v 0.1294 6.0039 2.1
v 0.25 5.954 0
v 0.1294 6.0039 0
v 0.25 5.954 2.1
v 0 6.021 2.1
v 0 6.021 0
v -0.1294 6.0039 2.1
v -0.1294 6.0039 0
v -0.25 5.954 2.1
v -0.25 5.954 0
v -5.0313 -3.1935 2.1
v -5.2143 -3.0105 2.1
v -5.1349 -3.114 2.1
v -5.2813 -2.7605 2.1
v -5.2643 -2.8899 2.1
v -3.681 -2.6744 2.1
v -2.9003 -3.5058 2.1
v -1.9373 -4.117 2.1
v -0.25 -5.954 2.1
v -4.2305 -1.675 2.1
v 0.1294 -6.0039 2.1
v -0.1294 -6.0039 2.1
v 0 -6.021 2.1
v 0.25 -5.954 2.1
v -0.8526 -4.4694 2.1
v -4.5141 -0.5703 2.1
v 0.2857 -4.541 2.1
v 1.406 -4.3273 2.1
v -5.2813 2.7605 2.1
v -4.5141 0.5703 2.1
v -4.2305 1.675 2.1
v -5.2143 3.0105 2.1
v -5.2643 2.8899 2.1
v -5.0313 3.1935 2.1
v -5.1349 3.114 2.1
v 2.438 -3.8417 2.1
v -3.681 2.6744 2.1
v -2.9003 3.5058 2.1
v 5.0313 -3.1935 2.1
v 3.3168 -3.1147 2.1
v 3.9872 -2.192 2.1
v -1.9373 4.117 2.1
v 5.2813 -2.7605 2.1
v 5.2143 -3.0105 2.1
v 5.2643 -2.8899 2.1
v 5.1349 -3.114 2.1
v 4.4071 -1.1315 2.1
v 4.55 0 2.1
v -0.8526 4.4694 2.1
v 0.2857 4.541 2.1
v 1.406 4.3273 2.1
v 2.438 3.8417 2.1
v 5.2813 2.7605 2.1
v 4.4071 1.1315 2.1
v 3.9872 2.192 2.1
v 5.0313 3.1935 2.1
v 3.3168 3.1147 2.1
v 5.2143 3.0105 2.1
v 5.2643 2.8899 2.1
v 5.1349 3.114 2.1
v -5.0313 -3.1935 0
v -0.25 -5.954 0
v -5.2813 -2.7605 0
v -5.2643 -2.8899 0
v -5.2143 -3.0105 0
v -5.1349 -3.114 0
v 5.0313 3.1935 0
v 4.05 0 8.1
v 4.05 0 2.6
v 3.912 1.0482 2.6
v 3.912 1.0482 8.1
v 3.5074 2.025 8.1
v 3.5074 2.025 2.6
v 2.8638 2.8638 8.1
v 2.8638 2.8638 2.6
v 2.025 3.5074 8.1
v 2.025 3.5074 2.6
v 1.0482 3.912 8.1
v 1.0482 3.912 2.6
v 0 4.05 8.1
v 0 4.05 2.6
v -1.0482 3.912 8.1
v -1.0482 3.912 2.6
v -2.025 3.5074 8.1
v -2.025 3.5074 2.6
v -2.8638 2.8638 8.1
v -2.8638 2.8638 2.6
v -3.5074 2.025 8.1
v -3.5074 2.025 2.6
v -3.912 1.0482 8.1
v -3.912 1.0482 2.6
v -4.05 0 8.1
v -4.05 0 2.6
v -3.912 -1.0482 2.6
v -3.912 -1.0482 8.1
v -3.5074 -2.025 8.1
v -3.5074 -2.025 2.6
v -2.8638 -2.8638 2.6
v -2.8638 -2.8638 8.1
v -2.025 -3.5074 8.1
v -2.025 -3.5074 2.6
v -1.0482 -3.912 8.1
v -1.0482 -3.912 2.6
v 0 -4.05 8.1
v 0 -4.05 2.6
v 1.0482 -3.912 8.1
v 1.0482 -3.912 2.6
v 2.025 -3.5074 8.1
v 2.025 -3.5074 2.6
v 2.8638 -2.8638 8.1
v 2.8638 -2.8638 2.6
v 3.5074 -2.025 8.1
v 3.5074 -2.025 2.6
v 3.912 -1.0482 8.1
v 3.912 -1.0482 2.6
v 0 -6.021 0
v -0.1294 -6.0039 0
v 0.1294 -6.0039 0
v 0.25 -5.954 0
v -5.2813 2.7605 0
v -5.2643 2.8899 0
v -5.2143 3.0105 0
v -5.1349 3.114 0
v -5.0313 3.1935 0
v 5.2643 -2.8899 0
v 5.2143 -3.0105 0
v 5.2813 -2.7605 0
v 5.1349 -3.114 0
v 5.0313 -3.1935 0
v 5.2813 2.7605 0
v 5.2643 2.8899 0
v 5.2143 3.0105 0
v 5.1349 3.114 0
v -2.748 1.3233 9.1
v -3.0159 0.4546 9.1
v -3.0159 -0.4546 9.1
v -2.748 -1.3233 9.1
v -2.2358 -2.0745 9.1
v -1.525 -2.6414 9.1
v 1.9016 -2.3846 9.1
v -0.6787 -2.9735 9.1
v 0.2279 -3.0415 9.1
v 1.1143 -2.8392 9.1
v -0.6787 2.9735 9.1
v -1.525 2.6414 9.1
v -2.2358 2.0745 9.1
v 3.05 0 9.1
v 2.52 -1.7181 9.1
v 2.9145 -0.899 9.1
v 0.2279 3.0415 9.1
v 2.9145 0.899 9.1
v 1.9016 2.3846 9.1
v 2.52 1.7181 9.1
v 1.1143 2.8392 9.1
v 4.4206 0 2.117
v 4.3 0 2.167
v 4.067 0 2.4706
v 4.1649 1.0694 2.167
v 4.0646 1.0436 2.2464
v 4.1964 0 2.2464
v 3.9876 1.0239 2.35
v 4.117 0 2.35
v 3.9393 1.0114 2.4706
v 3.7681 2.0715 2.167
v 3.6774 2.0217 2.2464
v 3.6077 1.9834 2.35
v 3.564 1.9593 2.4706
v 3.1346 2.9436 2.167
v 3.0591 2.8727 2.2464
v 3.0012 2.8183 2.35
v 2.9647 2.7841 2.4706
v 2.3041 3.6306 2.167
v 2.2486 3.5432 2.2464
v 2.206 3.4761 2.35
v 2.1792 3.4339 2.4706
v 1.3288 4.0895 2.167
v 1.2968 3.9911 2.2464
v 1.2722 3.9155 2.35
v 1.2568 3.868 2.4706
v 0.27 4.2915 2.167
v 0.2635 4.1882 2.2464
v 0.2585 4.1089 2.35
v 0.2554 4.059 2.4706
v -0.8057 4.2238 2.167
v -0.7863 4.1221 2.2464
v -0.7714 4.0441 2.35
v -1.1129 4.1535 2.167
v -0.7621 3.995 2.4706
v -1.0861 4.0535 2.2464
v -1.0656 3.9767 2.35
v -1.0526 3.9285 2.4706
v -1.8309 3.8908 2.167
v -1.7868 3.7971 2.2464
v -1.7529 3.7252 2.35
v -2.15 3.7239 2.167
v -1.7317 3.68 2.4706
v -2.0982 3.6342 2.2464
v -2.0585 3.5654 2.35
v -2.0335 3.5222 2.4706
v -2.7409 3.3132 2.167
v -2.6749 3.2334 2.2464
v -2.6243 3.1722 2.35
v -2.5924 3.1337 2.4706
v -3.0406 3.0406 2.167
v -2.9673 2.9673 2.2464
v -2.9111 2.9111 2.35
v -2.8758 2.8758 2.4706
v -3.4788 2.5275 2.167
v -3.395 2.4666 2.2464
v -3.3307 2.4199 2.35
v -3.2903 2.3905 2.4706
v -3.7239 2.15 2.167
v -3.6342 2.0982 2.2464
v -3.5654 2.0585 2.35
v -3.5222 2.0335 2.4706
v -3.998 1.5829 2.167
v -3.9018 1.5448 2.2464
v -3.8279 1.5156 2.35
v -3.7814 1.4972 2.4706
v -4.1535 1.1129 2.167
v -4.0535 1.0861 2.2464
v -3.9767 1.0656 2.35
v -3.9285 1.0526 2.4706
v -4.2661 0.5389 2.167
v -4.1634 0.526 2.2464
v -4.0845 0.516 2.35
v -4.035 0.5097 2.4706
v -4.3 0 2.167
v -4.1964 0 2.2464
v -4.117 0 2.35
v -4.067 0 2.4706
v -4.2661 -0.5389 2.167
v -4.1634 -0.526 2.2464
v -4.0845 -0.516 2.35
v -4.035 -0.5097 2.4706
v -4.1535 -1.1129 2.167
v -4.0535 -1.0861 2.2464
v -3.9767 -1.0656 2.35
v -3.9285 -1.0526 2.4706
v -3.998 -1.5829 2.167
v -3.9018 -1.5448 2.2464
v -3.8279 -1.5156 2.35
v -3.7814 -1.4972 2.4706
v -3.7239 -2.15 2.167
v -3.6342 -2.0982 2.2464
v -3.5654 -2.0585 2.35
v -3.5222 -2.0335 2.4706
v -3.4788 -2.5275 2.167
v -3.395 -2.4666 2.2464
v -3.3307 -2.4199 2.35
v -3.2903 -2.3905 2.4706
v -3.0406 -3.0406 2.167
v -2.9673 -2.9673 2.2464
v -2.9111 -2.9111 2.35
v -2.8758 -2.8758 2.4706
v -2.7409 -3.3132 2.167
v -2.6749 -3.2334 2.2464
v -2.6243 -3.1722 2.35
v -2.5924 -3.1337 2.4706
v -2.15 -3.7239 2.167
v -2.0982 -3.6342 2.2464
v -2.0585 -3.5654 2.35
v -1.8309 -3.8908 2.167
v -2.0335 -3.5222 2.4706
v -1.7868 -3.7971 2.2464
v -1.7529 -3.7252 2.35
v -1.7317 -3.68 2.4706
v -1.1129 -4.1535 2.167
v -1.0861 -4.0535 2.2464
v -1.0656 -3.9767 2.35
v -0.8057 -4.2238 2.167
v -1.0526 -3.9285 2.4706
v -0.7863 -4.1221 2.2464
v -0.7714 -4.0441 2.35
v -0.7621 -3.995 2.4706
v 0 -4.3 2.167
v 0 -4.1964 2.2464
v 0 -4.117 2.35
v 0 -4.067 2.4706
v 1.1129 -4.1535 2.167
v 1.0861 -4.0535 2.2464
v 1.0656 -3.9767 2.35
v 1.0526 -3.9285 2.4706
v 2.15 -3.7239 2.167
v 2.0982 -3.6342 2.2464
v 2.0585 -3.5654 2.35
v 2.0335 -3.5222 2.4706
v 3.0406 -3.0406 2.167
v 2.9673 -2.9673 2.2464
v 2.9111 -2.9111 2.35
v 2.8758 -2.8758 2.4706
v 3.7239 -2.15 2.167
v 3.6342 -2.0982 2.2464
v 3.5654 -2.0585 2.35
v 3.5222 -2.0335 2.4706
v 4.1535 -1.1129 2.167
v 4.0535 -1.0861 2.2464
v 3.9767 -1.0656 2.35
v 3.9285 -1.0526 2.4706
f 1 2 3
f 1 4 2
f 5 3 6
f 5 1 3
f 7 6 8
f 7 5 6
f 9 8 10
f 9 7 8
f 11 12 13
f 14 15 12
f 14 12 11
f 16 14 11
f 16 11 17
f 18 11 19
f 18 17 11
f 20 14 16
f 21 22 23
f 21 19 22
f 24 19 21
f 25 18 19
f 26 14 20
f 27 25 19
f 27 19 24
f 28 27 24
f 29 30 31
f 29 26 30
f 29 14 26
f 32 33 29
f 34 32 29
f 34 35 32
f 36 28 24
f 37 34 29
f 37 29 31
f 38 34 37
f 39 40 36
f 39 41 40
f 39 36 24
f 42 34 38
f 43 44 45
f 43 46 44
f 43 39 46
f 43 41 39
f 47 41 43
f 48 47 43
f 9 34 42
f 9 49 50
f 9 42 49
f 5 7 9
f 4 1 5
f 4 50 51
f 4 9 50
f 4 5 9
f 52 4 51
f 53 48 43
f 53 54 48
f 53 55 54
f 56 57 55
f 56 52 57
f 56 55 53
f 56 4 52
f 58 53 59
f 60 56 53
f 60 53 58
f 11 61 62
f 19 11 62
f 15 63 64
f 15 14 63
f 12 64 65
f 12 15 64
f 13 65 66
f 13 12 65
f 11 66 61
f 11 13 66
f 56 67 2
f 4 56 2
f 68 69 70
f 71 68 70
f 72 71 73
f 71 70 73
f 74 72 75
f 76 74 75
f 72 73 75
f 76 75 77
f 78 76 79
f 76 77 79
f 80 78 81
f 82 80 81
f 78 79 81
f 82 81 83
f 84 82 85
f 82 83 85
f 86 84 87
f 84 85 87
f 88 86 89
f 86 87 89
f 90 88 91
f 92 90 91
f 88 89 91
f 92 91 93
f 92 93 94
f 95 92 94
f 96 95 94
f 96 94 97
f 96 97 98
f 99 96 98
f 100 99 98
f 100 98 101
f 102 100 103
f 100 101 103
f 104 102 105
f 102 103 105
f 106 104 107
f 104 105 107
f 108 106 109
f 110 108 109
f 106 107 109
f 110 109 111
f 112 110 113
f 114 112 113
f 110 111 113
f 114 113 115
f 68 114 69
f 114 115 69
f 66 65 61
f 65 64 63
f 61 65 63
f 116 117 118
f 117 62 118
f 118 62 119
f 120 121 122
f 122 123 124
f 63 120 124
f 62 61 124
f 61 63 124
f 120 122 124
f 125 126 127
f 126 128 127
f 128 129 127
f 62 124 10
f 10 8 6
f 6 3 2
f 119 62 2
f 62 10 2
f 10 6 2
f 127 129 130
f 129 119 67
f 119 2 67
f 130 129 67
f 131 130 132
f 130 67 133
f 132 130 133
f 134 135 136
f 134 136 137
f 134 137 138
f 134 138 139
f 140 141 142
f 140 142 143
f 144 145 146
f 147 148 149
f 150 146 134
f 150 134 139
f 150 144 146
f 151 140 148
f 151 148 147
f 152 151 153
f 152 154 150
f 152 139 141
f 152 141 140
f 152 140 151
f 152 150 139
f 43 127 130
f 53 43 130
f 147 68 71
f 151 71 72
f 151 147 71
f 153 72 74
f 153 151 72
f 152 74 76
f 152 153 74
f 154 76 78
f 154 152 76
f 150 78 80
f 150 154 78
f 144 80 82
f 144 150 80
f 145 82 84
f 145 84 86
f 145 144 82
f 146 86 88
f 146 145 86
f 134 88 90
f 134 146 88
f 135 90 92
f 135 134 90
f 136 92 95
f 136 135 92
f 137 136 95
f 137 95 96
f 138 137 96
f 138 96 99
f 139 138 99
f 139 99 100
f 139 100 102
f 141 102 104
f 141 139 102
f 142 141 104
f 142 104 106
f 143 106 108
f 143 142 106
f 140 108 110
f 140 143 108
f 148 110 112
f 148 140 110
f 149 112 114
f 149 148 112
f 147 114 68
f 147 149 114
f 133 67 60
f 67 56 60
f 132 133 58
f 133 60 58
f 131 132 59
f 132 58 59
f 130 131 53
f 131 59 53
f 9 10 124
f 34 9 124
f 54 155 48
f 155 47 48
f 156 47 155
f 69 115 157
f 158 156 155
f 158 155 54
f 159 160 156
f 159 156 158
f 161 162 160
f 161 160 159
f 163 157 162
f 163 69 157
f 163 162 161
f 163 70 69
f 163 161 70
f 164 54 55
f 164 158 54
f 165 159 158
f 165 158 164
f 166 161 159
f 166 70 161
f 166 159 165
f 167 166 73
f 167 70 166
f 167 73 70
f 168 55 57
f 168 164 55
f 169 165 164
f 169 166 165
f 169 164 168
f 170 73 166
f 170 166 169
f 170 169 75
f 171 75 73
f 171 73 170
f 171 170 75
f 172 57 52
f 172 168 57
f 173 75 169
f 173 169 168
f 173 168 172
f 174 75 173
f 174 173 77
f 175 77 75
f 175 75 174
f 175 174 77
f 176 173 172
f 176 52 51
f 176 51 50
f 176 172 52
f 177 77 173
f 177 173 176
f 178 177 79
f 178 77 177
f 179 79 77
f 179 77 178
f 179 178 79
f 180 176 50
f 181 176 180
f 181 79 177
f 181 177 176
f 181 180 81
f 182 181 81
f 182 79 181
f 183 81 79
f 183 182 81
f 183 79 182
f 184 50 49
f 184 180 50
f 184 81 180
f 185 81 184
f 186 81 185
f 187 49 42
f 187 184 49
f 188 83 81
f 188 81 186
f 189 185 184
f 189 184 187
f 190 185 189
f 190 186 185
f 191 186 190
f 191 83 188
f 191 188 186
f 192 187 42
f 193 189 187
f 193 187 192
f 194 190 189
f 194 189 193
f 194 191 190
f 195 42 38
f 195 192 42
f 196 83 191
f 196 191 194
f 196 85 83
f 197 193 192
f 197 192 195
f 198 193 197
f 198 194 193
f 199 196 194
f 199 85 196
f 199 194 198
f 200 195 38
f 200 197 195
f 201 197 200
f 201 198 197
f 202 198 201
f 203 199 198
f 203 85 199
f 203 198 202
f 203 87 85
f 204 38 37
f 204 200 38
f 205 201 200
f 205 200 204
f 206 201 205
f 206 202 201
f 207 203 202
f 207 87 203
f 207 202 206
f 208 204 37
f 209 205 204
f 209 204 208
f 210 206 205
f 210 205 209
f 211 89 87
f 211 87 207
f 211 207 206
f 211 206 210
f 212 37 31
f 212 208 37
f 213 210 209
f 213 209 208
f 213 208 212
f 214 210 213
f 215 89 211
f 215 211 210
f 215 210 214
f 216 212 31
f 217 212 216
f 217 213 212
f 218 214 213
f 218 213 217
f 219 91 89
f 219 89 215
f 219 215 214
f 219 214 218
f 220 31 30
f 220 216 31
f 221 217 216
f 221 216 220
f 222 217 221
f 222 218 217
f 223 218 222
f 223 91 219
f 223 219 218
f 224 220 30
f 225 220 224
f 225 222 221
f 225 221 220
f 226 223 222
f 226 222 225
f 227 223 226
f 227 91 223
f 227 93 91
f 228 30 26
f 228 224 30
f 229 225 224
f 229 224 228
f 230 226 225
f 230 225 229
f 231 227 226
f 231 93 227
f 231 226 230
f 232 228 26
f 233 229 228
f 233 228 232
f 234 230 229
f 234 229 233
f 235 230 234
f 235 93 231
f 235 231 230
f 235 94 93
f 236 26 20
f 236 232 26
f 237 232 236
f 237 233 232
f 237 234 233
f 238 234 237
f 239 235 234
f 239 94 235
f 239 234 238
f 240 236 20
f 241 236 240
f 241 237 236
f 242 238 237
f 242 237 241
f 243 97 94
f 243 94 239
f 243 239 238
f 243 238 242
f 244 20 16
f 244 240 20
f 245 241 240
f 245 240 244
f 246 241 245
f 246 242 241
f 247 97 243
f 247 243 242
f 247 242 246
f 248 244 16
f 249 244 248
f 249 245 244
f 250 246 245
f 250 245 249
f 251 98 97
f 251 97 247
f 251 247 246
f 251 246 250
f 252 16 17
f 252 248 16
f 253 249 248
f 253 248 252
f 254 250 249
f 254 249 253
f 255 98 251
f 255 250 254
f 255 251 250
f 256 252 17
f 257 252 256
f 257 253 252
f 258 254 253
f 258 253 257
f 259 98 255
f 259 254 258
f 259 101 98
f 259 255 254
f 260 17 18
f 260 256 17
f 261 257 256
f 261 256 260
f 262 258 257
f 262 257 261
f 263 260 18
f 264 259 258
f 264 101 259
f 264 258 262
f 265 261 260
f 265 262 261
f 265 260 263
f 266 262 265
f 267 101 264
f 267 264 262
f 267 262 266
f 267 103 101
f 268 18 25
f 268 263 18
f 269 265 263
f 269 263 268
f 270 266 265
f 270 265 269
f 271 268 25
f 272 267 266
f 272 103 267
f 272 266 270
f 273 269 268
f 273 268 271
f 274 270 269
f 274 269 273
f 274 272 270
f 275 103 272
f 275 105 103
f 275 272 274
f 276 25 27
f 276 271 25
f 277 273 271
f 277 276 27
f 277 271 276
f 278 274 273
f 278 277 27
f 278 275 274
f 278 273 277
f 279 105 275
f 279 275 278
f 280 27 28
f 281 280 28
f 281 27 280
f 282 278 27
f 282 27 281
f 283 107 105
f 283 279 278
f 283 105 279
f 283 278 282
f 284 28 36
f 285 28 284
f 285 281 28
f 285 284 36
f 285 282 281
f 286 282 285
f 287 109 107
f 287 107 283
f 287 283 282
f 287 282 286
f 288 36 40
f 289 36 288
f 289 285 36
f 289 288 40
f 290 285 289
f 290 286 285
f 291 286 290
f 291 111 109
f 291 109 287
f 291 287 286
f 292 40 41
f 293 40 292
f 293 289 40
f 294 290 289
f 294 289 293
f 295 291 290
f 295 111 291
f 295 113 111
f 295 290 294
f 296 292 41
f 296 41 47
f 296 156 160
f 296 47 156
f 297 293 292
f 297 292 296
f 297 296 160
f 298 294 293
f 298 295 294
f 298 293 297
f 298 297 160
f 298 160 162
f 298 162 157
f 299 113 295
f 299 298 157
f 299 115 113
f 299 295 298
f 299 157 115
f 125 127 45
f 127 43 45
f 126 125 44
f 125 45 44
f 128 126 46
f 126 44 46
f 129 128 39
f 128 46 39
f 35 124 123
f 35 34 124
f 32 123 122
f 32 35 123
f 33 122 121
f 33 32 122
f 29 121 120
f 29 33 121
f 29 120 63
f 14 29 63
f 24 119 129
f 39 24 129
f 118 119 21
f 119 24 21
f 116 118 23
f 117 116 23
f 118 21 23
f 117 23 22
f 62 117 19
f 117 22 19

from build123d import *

# Parameters (mm, degrees)
BOSS_EXTRUDE1_DEPTH = 2.1
SKETCH2_R           = 4.05
BOSS_EXTRUDE2_DEPTH = 7
FILLET1_R           = 0.5
CHAMFER1_SIZE       = 1


with BuildPart() as part:
    # Sketch1 → Boss-Extrude1 (new body)
    with BuildSketch(Plane.XY):
        Polygon((5.281312122, 3.049166975), (0, 6.09833395), (-5.281312122, 3.049166975), (-5.281312122, -3.049166975), (0, -6.09833395), (5.281312122, -3.049166975), align=None)
    extrude(amount=BOSS_EXTRUDE1_DEPTH)

    # Sketch2 → Boss-Extrude2 (add)
    with BuildSketch(Plane.XY.offset(2.1)):
        Circle(SKETCH2_R)
    extrude(amount=BOSS_EXTRUDE2_DEPTH)

    # Fillet1
    fillet1_edges = [part.edges().sort_by_distance(p)[0] for p in [
        (5.281312122, -3.049166975, 1.05),
        (0, -6.09833395, 1.05),
        (-5.281312122, -3.049166975, 1.05),
        (-5.281312122, 3.049166975, 1.05),
        (0, 6.09833395, 1.05),
        (5.281312122, 3.049166975, 1.05),
        (-4.05, 0, 2.1),
    ]]
    fillet(fillet1_edges, radius=FILLET1_R)

    # Chamfer1
    chamfer1_edges = [part.edges().sort_by_distance(p)[0] for p in [
        (-4.05, 0, 9.1),
    ]]
    chamfer(chamfer1_edges, length=CHAMFER1_SIZE)


solid = part.part
